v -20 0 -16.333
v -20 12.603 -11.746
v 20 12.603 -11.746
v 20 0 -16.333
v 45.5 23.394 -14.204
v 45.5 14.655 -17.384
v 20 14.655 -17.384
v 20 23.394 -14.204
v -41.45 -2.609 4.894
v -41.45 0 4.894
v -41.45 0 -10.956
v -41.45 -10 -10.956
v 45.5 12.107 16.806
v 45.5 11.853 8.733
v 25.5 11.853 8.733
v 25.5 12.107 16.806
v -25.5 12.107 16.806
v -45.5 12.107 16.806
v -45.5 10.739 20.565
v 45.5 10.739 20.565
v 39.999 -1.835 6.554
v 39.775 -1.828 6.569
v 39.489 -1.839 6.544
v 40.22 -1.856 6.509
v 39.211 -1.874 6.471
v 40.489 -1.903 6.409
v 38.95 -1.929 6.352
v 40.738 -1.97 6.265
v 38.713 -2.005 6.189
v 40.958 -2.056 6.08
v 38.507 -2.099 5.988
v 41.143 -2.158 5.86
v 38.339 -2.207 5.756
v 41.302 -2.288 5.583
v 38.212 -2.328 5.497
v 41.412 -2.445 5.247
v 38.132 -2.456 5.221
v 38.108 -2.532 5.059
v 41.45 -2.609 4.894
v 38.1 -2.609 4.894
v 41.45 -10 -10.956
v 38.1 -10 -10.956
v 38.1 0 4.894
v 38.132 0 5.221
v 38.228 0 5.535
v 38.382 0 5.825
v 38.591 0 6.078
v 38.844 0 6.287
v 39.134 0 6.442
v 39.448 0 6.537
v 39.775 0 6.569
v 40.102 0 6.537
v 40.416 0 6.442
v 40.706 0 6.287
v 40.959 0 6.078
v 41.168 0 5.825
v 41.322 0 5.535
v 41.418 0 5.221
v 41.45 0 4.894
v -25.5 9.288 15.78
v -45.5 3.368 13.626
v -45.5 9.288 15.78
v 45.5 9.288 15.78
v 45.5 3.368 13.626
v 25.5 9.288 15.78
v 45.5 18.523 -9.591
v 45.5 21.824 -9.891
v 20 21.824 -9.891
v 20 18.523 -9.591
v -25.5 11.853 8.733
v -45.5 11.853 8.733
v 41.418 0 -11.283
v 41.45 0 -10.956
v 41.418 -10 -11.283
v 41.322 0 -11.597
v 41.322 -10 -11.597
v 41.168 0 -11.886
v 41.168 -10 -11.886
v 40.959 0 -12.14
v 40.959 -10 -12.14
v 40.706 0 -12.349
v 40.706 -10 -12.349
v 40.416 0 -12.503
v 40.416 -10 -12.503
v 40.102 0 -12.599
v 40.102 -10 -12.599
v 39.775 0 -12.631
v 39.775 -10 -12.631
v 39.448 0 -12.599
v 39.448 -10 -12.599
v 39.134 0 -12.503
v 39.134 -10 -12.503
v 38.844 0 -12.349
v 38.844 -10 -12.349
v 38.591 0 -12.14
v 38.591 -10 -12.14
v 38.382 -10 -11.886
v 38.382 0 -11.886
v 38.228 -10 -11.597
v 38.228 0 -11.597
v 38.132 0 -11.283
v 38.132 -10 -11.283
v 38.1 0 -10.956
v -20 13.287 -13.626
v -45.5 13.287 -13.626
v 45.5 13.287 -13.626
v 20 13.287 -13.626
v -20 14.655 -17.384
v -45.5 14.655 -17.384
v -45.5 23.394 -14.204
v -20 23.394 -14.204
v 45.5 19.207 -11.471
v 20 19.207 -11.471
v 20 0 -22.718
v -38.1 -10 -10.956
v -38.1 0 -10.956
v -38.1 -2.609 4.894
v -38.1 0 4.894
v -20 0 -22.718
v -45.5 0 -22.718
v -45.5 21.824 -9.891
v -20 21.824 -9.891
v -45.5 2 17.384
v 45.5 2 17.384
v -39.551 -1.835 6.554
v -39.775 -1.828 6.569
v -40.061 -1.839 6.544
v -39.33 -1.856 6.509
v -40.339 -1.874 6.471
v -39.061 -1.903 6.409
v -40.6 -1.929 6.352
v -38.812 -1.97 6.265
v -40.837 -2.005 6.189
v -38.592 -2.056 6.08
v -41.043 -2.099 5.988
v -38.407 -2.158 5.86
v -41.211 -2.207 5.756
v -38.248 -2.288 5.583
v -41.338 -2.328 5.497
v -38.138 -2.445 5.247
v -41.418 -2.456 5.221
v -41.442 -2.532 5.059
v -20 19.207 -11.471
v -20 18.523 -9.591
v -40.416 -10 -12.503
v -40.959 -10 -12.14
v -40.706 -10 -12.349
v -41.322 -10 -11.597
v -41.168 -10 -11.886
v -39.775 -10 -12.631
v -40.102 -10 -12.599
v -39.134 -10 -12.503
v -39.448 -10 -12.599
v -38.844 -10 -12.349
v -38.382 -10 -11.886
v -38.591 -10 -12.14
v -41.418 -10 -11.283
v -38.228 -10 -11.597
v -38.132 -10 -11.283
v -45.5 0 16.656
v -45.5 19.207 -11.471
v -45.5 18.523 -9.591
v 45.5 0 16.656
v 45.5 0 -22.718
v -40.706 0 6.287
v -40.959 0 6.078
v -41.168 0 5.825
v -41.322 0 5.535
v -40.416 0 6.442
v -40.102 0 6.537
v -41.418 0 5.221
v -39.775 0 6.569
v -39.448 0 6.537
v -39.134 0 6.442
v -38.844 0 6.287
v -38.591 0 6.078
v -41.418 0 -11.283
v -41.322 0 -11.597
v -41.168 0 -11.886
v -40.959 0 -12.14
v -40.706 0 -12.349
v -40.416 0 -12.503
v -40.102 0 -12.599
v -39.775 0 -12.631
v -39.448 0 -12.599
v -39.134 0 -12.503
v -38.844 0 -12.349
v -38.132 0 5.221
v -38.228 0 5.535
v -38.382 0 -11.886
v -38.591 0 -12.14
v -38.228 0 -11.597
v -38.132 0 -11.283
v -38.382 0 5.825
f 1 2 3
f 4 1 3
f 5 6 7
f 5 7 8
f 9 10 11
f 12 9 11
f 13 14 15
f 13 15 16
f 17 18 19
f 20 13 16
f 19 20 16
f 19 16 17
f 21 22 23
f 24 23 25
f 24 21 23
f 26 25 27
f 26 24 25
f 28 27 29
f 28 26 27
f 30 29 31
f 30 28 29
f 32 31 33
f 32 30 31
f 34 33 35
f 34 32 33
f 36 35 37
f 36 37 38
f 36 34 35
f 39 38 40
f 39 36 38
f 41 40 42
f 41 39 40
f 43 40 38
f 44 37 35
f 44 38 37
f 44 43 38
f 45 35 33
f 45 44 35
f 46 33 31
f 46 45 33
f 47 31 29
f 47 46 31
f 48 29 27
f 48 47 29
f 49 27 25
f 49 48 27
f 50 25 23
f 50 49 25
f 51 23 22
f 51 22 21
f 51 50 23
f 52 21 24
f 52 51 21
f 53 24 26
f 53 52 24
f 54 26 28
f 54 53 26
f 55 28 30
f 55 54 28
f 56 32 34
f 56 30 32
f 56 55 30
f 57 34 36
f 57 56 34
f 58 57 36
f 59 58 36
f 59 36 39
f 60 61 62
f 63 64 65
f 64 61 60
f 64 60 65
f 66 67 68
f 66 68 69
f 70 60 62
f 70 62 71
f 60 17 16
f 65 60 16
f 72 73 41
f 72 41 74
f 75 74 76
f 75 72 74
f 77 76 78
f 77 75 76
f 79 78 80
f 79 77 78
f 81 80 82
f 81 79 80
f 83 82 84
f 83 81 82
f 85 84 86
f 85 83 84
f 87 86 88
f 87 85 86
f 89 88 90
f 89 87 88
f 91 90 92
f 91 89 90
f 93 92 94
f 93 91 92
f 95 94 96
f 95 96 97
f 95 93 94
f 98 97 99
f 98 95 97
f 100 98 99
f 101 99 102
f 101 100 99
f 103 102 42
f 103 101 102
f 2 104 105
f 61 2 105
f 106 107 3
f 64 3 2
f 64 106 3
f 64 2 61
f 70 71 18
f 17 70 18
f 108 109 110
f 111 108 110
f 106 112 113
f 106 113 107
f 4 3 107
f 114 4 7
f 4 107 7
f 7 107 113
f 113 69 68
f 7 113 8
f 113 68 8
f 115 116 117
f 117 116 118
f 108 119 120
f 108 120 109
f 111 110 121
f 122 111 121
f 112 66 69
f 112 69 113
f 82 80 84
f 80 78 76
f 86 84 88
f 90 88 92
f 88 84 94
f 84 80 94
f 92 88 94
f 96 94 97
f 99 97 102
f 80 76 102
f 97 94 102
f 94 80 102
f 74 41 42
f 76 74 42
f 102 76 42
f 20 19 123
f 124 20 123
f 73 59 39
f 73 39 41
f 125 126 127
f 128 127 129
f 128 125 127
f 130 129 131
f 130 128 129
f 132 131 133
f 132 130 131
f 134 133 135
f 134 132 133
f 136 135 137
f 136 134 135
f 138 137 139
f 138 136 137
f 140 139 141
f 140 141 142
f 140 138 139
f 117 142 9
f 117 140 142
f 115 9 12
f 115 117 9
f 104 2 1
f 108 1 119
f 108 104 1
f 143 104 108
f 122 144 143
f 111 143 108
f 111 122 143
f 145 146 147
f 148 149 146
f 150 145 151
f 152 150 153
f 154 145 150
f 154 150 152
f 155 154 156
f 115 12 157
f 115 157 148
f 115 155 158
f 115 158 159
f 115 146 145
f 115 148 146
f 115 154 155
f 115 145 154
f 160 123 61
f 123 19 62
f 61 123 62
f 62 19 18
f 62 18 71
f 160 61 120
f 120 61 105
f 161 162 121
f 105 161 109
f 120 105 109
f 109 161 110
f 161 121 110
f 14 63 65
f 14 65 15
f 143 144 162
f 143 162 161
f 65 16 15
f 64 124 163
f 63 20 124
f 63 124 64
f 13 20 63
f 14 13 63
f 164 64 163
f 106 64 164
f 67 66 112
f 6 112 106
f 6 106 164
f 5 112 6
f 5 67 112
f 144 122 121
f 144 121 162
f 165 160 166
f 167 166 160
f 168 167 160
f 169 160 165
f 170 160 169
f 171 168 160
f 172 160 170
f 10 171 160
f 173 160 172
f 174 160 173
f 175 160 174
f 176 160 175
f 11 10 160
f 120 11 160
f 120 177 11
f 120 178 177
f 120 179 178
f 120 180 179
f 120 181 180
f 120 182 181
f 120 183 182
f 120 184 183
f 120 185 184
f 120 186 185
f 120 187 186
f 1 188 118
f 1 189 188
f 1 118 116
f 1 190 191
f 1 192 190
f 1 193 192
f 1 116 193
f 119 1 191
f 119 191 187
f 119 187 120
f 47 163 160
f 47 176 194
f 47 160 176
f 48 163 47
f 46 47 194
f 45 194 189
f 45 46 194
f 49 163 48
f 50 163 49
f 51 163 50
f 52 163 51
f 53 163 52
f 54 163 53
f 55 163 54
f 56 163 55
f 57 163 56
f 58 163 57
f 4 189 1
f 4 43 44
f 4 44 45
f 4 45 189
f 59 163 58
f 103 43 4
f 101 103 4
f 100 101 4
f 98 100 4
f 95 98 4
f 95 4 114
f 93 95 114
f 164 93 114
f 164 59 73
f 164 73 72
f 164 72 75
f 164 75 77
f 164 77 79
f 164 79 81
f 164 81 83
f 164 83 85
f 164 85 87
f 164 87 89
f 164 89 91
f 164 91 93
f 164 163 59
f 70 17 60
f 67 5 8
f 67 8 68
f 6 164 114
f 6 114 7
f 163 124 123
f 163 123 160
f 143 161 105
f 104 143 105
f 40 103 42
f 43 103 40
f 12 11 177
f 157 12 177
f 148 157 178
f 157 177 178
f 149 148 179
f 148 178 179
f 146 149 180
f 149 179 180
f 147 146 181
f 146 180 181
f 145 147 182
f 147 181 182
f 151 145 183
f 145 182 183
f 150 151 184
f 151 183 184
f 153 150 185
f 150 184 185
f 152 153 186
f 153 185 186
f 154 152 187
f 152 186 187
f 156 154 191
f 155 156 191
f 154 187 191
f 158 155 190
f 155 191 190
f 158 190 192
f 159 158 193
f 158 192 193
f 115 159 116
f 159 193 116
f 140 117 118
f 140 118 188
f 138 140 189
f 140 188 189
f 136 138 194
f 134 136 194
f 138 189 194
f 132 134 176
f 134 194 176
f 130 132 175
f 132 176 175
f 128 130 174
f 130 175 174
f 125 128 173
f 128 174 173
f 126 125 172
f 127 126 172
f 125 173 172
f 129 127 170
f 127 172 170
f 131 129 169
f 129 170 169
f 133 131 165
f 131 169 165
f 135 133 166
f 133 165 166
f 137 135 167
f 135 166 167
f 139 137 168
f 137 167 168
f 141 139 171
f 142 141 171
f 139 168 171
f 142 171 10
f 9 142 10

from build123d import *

# Parameters (mm, degrees)
BOSS_EXTRUDE1_DEPTH = 45.5
CUT_EXTRUDE1_REACH  = 58.087
SKETCH3_W           = 51
SKETCH3_H           = 7.5
SKETCH3_W_2         = 40
SKETCH3_H_2         = 6
BOSS_EXTRUDE2_DEPTH = 10
CUT_EXTRUDE3_DEPTH  = 93.863842547


with BuildPart() as part:
    # Sketch2 → Boss-Extrude1 (new, symmetric)
    with BuildSketch(Plane(origin=(0, 0, 0), x_dir=(0, 0, -1), z_dir=(1, 0, 0))):
        Polygon((-13.625543001, 3.368080573), (-15.780269904, 9.288144084), (-8.732575248, 11.853295159), (-16.806330334, 12.107221947), (-20.565100817, 10.739141373), (-17.384313485, 2), (-16.656373016, 0), (22.718204566, 0), (17.384313485, 14.654745303), (14.203526152, 23.393886676), (9.891430857, 21.824412342), (9.591430857, 18.522687954), (11.470816098, 19.206728241), (13.625543001, 13.28666473), align=None)
    extrude(amount=BOSS_EXTRUDE1_DEPTH, both=True)

    # Sketch3 → Cut-Extrude1 (cut, up to next)
    with BuildSketch(Plane(origin=(0, 16.092396472, 5.857153314), x_dir=(1, 0, 0), z_dir=(0, 0.9396926207859102, 0.34202014332566394)), mode=Mode.PRIVATE) as cut_extrude1_sk1:
        with Locations((0, -7.901870812)):
            Rectangle(SKETCH3_W, SKETCH3_H)
    cut_extrude1_tool1 = extrude(cut_extrude1_sk1.sketch, amount=-CUT_EXTRUDE1_REACH, mode=Mode.PRIVATE) & part.part
    # Sketch3 → Cut-Extrude1 (cut, up to next)
    with BuildSketch(Plane(origin=(0, 16.092396472, 5.857153314), x_dir=(1, 0, 0), z_dir=(0, 0.9396926207859102, 0.34202014332566394)), mode=Mode.PRIVATE) as cut_extrude1_sk2:
        with Locations((0, 18.348129188)):
            Rectangle(SKETCH3_W_2, SKETCH3_H_2)
    cut_extrude1_tool2 = extrude(cut_extrude1_sk2.sketch, amount=-CUT_EXTRUDE1_REACH, mode=Mode.PRIVATE) & part.part
    add(cut_extrude1_tool1.solids().sort_by_distance((0, 13.389797, 13.282483))[0], mode=Mode.SUBTRACT)
    add(cut_extrude1_tool2.solids().sort_by_distance((0, 22.367826, -11.384448))[0], mode=Mode.SUBTRACT)

    # Sketch4 → Boss-Extrude2 (add)
    with BuildSketch(Plane.XZ):
        with BuildLine():
            Line((41.45, 4.894084225), (41.45, -10.955915775))
            ThreePointArc((41.45, -10.955915775), (39.775, -12.630915775), (38.1, -10.955915775))
            Line((38.1, -10.955915775), (38.1, 4.894084225))
            ThreePointArc((38.1, 4.894084225), (39.775, 6.569084225), (41.45, 4.894084225))
        make_face()
        with BuildLine():
            Line((-41.45, 4.894084225), (-41.45, -10.955915775))
            ThreePointArc((-41.45, -10.955915775), (-39.775, -12.630915775), (-38.1, -10.955915775))
            Line((-38.1, -10.955915775), (-38.1, 4.894084225))
            ThreePointArc((-38.1, 4.894084225), (-39.775, 6.569084225), (-41.45, 4.894084225))
        make_face()
    extrude(amount=BOSS_EXTRUDE2_DEPTH)

    # Sketch5 → Cut-Extrude3 (cut, through all)
    with BuildSketch(Plane(origin=(41.45, 0, 0), x_dir=(0, 0, -1), z_dir=(1, 0, 0))):
        Polygon((-6.569084225, -1.827958291), (10.955915775, -10), (-6.569084225, -10), align=None)
    extrude(amount=-CUT_EXTRUDE3_DEPTH, mode=Mode.SUBTRACT)


solid = part.part
